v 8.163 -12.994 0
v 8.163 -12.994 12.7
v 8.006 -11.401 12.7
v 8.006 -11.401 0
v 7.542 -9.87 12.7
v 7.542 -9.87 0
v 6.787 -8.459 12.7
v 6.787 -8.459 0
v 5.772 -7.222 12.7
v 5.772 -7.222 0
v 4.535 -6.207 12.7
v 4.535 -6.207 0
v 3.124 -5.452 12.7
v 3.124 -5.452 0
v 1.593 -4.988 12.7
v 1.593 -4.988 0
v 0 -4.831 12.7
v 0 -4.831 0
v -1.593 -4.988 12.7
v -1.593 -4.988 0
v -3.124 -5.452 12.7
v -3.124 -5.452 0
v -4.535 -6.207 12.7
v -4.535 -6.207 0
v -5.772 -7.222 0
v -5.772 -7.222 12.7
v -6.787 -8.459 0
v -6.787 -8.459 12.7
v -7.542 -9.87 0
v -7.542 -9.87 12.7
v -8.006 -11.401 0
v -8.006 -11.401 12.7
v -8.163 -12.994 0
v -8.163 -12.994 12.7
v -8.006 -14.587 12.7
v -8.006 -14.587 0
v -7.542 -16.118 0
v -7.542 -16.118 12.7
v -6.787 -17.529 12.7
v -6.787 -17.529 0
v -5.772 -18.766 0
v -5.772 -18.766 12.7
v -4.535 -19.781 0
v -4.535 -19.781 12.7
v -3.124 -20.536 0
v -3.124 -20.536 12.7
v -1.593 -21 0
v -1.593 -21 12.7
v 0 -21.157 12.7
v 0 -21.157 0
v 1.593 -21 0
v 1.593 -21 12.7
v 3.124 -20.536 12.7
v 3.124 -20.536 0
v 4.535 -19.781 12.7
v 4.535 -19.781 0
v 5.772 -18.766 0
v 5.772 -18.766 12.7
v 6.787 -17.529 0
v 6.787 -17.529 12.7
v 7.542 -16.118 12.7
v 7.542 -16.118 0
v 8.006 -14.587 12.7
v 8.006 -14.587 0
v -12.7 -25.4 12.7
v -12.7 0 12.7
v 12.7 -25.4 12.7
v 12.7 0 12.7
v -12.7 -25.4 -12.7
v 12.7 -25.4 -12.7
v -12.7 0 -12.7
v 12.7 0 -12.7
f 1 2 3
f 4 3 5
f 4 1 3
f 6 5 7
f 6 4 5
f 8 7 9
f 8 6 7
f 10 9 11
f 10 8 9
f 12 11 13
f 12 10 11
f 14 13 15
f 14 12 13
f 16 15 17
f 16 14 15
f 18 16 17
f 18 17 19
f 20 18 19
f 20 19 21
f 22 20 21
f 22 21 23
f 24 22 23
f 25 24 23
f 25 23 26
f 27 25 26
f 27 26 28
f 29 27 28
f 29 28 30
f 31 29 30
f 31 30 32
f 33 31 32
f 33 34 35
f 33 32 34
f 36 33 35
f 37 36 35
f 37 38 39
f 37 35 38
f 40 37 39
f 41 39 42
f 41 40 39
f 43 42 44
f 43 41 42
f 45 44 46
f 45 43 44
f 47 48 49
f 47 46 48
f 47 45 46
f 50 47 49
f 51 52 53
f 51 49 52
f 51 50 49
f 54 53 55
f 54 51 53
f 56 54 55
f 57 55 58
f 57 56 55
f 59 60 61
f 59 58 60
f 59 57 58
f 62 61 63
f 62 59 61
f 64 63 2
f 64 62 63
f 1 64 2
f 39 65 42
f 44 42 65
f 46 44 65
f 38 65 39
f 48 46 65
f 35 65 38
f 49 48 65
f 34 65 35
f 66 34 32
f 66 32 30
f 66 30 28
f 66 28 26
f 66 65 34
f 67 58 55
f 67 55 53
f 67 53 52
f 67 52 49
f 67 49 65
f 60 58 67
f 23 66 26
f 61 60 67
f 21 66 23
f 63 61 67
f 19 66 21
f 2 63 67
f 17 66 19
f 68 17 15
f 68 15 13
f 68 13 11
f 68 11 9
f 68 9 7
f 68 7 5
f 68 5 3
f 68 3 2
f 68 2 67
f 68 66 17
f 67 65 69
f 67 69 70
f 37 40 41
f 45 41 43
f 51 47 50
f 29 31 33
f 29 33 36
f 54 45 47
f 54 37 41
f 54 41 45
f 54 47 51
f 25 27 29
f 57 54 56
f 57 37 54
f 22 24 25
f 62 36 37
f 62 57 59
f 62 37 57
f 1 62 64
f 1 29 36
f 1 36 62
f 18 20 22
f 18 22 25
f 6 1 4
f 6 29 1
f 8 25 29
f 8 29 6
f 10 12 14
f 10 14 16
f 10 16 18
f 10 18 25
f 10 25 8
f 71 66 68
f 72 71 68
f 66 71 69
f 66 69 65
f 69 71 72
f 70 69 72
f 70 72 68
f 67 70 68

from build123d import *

# Parameters (mm, degrees)
F0_W     = 25.4
F0_H     = 25.4
F1_DEPTH = 25.4
F2_R     = 8.163201
F3_DEPTH = 12.701


with BuildPart() as f1:
    # F0 (on Front) → F1 (new body)
    with BuildSketch(Plane.XZ):
        Rectangle(F0_W, F0_H)
    extrude(amount=F1_DEPTH)

    # F2 (on Top) → F3 (cut, through all)
    with BuildSketch(Plane.XY):
        with Locations((0, -12.994025)):
            Circle(F2_R)
    extrude(amount=F3_DEPTH, mode=Mode.SUBTRACT)


solid = f1.part
